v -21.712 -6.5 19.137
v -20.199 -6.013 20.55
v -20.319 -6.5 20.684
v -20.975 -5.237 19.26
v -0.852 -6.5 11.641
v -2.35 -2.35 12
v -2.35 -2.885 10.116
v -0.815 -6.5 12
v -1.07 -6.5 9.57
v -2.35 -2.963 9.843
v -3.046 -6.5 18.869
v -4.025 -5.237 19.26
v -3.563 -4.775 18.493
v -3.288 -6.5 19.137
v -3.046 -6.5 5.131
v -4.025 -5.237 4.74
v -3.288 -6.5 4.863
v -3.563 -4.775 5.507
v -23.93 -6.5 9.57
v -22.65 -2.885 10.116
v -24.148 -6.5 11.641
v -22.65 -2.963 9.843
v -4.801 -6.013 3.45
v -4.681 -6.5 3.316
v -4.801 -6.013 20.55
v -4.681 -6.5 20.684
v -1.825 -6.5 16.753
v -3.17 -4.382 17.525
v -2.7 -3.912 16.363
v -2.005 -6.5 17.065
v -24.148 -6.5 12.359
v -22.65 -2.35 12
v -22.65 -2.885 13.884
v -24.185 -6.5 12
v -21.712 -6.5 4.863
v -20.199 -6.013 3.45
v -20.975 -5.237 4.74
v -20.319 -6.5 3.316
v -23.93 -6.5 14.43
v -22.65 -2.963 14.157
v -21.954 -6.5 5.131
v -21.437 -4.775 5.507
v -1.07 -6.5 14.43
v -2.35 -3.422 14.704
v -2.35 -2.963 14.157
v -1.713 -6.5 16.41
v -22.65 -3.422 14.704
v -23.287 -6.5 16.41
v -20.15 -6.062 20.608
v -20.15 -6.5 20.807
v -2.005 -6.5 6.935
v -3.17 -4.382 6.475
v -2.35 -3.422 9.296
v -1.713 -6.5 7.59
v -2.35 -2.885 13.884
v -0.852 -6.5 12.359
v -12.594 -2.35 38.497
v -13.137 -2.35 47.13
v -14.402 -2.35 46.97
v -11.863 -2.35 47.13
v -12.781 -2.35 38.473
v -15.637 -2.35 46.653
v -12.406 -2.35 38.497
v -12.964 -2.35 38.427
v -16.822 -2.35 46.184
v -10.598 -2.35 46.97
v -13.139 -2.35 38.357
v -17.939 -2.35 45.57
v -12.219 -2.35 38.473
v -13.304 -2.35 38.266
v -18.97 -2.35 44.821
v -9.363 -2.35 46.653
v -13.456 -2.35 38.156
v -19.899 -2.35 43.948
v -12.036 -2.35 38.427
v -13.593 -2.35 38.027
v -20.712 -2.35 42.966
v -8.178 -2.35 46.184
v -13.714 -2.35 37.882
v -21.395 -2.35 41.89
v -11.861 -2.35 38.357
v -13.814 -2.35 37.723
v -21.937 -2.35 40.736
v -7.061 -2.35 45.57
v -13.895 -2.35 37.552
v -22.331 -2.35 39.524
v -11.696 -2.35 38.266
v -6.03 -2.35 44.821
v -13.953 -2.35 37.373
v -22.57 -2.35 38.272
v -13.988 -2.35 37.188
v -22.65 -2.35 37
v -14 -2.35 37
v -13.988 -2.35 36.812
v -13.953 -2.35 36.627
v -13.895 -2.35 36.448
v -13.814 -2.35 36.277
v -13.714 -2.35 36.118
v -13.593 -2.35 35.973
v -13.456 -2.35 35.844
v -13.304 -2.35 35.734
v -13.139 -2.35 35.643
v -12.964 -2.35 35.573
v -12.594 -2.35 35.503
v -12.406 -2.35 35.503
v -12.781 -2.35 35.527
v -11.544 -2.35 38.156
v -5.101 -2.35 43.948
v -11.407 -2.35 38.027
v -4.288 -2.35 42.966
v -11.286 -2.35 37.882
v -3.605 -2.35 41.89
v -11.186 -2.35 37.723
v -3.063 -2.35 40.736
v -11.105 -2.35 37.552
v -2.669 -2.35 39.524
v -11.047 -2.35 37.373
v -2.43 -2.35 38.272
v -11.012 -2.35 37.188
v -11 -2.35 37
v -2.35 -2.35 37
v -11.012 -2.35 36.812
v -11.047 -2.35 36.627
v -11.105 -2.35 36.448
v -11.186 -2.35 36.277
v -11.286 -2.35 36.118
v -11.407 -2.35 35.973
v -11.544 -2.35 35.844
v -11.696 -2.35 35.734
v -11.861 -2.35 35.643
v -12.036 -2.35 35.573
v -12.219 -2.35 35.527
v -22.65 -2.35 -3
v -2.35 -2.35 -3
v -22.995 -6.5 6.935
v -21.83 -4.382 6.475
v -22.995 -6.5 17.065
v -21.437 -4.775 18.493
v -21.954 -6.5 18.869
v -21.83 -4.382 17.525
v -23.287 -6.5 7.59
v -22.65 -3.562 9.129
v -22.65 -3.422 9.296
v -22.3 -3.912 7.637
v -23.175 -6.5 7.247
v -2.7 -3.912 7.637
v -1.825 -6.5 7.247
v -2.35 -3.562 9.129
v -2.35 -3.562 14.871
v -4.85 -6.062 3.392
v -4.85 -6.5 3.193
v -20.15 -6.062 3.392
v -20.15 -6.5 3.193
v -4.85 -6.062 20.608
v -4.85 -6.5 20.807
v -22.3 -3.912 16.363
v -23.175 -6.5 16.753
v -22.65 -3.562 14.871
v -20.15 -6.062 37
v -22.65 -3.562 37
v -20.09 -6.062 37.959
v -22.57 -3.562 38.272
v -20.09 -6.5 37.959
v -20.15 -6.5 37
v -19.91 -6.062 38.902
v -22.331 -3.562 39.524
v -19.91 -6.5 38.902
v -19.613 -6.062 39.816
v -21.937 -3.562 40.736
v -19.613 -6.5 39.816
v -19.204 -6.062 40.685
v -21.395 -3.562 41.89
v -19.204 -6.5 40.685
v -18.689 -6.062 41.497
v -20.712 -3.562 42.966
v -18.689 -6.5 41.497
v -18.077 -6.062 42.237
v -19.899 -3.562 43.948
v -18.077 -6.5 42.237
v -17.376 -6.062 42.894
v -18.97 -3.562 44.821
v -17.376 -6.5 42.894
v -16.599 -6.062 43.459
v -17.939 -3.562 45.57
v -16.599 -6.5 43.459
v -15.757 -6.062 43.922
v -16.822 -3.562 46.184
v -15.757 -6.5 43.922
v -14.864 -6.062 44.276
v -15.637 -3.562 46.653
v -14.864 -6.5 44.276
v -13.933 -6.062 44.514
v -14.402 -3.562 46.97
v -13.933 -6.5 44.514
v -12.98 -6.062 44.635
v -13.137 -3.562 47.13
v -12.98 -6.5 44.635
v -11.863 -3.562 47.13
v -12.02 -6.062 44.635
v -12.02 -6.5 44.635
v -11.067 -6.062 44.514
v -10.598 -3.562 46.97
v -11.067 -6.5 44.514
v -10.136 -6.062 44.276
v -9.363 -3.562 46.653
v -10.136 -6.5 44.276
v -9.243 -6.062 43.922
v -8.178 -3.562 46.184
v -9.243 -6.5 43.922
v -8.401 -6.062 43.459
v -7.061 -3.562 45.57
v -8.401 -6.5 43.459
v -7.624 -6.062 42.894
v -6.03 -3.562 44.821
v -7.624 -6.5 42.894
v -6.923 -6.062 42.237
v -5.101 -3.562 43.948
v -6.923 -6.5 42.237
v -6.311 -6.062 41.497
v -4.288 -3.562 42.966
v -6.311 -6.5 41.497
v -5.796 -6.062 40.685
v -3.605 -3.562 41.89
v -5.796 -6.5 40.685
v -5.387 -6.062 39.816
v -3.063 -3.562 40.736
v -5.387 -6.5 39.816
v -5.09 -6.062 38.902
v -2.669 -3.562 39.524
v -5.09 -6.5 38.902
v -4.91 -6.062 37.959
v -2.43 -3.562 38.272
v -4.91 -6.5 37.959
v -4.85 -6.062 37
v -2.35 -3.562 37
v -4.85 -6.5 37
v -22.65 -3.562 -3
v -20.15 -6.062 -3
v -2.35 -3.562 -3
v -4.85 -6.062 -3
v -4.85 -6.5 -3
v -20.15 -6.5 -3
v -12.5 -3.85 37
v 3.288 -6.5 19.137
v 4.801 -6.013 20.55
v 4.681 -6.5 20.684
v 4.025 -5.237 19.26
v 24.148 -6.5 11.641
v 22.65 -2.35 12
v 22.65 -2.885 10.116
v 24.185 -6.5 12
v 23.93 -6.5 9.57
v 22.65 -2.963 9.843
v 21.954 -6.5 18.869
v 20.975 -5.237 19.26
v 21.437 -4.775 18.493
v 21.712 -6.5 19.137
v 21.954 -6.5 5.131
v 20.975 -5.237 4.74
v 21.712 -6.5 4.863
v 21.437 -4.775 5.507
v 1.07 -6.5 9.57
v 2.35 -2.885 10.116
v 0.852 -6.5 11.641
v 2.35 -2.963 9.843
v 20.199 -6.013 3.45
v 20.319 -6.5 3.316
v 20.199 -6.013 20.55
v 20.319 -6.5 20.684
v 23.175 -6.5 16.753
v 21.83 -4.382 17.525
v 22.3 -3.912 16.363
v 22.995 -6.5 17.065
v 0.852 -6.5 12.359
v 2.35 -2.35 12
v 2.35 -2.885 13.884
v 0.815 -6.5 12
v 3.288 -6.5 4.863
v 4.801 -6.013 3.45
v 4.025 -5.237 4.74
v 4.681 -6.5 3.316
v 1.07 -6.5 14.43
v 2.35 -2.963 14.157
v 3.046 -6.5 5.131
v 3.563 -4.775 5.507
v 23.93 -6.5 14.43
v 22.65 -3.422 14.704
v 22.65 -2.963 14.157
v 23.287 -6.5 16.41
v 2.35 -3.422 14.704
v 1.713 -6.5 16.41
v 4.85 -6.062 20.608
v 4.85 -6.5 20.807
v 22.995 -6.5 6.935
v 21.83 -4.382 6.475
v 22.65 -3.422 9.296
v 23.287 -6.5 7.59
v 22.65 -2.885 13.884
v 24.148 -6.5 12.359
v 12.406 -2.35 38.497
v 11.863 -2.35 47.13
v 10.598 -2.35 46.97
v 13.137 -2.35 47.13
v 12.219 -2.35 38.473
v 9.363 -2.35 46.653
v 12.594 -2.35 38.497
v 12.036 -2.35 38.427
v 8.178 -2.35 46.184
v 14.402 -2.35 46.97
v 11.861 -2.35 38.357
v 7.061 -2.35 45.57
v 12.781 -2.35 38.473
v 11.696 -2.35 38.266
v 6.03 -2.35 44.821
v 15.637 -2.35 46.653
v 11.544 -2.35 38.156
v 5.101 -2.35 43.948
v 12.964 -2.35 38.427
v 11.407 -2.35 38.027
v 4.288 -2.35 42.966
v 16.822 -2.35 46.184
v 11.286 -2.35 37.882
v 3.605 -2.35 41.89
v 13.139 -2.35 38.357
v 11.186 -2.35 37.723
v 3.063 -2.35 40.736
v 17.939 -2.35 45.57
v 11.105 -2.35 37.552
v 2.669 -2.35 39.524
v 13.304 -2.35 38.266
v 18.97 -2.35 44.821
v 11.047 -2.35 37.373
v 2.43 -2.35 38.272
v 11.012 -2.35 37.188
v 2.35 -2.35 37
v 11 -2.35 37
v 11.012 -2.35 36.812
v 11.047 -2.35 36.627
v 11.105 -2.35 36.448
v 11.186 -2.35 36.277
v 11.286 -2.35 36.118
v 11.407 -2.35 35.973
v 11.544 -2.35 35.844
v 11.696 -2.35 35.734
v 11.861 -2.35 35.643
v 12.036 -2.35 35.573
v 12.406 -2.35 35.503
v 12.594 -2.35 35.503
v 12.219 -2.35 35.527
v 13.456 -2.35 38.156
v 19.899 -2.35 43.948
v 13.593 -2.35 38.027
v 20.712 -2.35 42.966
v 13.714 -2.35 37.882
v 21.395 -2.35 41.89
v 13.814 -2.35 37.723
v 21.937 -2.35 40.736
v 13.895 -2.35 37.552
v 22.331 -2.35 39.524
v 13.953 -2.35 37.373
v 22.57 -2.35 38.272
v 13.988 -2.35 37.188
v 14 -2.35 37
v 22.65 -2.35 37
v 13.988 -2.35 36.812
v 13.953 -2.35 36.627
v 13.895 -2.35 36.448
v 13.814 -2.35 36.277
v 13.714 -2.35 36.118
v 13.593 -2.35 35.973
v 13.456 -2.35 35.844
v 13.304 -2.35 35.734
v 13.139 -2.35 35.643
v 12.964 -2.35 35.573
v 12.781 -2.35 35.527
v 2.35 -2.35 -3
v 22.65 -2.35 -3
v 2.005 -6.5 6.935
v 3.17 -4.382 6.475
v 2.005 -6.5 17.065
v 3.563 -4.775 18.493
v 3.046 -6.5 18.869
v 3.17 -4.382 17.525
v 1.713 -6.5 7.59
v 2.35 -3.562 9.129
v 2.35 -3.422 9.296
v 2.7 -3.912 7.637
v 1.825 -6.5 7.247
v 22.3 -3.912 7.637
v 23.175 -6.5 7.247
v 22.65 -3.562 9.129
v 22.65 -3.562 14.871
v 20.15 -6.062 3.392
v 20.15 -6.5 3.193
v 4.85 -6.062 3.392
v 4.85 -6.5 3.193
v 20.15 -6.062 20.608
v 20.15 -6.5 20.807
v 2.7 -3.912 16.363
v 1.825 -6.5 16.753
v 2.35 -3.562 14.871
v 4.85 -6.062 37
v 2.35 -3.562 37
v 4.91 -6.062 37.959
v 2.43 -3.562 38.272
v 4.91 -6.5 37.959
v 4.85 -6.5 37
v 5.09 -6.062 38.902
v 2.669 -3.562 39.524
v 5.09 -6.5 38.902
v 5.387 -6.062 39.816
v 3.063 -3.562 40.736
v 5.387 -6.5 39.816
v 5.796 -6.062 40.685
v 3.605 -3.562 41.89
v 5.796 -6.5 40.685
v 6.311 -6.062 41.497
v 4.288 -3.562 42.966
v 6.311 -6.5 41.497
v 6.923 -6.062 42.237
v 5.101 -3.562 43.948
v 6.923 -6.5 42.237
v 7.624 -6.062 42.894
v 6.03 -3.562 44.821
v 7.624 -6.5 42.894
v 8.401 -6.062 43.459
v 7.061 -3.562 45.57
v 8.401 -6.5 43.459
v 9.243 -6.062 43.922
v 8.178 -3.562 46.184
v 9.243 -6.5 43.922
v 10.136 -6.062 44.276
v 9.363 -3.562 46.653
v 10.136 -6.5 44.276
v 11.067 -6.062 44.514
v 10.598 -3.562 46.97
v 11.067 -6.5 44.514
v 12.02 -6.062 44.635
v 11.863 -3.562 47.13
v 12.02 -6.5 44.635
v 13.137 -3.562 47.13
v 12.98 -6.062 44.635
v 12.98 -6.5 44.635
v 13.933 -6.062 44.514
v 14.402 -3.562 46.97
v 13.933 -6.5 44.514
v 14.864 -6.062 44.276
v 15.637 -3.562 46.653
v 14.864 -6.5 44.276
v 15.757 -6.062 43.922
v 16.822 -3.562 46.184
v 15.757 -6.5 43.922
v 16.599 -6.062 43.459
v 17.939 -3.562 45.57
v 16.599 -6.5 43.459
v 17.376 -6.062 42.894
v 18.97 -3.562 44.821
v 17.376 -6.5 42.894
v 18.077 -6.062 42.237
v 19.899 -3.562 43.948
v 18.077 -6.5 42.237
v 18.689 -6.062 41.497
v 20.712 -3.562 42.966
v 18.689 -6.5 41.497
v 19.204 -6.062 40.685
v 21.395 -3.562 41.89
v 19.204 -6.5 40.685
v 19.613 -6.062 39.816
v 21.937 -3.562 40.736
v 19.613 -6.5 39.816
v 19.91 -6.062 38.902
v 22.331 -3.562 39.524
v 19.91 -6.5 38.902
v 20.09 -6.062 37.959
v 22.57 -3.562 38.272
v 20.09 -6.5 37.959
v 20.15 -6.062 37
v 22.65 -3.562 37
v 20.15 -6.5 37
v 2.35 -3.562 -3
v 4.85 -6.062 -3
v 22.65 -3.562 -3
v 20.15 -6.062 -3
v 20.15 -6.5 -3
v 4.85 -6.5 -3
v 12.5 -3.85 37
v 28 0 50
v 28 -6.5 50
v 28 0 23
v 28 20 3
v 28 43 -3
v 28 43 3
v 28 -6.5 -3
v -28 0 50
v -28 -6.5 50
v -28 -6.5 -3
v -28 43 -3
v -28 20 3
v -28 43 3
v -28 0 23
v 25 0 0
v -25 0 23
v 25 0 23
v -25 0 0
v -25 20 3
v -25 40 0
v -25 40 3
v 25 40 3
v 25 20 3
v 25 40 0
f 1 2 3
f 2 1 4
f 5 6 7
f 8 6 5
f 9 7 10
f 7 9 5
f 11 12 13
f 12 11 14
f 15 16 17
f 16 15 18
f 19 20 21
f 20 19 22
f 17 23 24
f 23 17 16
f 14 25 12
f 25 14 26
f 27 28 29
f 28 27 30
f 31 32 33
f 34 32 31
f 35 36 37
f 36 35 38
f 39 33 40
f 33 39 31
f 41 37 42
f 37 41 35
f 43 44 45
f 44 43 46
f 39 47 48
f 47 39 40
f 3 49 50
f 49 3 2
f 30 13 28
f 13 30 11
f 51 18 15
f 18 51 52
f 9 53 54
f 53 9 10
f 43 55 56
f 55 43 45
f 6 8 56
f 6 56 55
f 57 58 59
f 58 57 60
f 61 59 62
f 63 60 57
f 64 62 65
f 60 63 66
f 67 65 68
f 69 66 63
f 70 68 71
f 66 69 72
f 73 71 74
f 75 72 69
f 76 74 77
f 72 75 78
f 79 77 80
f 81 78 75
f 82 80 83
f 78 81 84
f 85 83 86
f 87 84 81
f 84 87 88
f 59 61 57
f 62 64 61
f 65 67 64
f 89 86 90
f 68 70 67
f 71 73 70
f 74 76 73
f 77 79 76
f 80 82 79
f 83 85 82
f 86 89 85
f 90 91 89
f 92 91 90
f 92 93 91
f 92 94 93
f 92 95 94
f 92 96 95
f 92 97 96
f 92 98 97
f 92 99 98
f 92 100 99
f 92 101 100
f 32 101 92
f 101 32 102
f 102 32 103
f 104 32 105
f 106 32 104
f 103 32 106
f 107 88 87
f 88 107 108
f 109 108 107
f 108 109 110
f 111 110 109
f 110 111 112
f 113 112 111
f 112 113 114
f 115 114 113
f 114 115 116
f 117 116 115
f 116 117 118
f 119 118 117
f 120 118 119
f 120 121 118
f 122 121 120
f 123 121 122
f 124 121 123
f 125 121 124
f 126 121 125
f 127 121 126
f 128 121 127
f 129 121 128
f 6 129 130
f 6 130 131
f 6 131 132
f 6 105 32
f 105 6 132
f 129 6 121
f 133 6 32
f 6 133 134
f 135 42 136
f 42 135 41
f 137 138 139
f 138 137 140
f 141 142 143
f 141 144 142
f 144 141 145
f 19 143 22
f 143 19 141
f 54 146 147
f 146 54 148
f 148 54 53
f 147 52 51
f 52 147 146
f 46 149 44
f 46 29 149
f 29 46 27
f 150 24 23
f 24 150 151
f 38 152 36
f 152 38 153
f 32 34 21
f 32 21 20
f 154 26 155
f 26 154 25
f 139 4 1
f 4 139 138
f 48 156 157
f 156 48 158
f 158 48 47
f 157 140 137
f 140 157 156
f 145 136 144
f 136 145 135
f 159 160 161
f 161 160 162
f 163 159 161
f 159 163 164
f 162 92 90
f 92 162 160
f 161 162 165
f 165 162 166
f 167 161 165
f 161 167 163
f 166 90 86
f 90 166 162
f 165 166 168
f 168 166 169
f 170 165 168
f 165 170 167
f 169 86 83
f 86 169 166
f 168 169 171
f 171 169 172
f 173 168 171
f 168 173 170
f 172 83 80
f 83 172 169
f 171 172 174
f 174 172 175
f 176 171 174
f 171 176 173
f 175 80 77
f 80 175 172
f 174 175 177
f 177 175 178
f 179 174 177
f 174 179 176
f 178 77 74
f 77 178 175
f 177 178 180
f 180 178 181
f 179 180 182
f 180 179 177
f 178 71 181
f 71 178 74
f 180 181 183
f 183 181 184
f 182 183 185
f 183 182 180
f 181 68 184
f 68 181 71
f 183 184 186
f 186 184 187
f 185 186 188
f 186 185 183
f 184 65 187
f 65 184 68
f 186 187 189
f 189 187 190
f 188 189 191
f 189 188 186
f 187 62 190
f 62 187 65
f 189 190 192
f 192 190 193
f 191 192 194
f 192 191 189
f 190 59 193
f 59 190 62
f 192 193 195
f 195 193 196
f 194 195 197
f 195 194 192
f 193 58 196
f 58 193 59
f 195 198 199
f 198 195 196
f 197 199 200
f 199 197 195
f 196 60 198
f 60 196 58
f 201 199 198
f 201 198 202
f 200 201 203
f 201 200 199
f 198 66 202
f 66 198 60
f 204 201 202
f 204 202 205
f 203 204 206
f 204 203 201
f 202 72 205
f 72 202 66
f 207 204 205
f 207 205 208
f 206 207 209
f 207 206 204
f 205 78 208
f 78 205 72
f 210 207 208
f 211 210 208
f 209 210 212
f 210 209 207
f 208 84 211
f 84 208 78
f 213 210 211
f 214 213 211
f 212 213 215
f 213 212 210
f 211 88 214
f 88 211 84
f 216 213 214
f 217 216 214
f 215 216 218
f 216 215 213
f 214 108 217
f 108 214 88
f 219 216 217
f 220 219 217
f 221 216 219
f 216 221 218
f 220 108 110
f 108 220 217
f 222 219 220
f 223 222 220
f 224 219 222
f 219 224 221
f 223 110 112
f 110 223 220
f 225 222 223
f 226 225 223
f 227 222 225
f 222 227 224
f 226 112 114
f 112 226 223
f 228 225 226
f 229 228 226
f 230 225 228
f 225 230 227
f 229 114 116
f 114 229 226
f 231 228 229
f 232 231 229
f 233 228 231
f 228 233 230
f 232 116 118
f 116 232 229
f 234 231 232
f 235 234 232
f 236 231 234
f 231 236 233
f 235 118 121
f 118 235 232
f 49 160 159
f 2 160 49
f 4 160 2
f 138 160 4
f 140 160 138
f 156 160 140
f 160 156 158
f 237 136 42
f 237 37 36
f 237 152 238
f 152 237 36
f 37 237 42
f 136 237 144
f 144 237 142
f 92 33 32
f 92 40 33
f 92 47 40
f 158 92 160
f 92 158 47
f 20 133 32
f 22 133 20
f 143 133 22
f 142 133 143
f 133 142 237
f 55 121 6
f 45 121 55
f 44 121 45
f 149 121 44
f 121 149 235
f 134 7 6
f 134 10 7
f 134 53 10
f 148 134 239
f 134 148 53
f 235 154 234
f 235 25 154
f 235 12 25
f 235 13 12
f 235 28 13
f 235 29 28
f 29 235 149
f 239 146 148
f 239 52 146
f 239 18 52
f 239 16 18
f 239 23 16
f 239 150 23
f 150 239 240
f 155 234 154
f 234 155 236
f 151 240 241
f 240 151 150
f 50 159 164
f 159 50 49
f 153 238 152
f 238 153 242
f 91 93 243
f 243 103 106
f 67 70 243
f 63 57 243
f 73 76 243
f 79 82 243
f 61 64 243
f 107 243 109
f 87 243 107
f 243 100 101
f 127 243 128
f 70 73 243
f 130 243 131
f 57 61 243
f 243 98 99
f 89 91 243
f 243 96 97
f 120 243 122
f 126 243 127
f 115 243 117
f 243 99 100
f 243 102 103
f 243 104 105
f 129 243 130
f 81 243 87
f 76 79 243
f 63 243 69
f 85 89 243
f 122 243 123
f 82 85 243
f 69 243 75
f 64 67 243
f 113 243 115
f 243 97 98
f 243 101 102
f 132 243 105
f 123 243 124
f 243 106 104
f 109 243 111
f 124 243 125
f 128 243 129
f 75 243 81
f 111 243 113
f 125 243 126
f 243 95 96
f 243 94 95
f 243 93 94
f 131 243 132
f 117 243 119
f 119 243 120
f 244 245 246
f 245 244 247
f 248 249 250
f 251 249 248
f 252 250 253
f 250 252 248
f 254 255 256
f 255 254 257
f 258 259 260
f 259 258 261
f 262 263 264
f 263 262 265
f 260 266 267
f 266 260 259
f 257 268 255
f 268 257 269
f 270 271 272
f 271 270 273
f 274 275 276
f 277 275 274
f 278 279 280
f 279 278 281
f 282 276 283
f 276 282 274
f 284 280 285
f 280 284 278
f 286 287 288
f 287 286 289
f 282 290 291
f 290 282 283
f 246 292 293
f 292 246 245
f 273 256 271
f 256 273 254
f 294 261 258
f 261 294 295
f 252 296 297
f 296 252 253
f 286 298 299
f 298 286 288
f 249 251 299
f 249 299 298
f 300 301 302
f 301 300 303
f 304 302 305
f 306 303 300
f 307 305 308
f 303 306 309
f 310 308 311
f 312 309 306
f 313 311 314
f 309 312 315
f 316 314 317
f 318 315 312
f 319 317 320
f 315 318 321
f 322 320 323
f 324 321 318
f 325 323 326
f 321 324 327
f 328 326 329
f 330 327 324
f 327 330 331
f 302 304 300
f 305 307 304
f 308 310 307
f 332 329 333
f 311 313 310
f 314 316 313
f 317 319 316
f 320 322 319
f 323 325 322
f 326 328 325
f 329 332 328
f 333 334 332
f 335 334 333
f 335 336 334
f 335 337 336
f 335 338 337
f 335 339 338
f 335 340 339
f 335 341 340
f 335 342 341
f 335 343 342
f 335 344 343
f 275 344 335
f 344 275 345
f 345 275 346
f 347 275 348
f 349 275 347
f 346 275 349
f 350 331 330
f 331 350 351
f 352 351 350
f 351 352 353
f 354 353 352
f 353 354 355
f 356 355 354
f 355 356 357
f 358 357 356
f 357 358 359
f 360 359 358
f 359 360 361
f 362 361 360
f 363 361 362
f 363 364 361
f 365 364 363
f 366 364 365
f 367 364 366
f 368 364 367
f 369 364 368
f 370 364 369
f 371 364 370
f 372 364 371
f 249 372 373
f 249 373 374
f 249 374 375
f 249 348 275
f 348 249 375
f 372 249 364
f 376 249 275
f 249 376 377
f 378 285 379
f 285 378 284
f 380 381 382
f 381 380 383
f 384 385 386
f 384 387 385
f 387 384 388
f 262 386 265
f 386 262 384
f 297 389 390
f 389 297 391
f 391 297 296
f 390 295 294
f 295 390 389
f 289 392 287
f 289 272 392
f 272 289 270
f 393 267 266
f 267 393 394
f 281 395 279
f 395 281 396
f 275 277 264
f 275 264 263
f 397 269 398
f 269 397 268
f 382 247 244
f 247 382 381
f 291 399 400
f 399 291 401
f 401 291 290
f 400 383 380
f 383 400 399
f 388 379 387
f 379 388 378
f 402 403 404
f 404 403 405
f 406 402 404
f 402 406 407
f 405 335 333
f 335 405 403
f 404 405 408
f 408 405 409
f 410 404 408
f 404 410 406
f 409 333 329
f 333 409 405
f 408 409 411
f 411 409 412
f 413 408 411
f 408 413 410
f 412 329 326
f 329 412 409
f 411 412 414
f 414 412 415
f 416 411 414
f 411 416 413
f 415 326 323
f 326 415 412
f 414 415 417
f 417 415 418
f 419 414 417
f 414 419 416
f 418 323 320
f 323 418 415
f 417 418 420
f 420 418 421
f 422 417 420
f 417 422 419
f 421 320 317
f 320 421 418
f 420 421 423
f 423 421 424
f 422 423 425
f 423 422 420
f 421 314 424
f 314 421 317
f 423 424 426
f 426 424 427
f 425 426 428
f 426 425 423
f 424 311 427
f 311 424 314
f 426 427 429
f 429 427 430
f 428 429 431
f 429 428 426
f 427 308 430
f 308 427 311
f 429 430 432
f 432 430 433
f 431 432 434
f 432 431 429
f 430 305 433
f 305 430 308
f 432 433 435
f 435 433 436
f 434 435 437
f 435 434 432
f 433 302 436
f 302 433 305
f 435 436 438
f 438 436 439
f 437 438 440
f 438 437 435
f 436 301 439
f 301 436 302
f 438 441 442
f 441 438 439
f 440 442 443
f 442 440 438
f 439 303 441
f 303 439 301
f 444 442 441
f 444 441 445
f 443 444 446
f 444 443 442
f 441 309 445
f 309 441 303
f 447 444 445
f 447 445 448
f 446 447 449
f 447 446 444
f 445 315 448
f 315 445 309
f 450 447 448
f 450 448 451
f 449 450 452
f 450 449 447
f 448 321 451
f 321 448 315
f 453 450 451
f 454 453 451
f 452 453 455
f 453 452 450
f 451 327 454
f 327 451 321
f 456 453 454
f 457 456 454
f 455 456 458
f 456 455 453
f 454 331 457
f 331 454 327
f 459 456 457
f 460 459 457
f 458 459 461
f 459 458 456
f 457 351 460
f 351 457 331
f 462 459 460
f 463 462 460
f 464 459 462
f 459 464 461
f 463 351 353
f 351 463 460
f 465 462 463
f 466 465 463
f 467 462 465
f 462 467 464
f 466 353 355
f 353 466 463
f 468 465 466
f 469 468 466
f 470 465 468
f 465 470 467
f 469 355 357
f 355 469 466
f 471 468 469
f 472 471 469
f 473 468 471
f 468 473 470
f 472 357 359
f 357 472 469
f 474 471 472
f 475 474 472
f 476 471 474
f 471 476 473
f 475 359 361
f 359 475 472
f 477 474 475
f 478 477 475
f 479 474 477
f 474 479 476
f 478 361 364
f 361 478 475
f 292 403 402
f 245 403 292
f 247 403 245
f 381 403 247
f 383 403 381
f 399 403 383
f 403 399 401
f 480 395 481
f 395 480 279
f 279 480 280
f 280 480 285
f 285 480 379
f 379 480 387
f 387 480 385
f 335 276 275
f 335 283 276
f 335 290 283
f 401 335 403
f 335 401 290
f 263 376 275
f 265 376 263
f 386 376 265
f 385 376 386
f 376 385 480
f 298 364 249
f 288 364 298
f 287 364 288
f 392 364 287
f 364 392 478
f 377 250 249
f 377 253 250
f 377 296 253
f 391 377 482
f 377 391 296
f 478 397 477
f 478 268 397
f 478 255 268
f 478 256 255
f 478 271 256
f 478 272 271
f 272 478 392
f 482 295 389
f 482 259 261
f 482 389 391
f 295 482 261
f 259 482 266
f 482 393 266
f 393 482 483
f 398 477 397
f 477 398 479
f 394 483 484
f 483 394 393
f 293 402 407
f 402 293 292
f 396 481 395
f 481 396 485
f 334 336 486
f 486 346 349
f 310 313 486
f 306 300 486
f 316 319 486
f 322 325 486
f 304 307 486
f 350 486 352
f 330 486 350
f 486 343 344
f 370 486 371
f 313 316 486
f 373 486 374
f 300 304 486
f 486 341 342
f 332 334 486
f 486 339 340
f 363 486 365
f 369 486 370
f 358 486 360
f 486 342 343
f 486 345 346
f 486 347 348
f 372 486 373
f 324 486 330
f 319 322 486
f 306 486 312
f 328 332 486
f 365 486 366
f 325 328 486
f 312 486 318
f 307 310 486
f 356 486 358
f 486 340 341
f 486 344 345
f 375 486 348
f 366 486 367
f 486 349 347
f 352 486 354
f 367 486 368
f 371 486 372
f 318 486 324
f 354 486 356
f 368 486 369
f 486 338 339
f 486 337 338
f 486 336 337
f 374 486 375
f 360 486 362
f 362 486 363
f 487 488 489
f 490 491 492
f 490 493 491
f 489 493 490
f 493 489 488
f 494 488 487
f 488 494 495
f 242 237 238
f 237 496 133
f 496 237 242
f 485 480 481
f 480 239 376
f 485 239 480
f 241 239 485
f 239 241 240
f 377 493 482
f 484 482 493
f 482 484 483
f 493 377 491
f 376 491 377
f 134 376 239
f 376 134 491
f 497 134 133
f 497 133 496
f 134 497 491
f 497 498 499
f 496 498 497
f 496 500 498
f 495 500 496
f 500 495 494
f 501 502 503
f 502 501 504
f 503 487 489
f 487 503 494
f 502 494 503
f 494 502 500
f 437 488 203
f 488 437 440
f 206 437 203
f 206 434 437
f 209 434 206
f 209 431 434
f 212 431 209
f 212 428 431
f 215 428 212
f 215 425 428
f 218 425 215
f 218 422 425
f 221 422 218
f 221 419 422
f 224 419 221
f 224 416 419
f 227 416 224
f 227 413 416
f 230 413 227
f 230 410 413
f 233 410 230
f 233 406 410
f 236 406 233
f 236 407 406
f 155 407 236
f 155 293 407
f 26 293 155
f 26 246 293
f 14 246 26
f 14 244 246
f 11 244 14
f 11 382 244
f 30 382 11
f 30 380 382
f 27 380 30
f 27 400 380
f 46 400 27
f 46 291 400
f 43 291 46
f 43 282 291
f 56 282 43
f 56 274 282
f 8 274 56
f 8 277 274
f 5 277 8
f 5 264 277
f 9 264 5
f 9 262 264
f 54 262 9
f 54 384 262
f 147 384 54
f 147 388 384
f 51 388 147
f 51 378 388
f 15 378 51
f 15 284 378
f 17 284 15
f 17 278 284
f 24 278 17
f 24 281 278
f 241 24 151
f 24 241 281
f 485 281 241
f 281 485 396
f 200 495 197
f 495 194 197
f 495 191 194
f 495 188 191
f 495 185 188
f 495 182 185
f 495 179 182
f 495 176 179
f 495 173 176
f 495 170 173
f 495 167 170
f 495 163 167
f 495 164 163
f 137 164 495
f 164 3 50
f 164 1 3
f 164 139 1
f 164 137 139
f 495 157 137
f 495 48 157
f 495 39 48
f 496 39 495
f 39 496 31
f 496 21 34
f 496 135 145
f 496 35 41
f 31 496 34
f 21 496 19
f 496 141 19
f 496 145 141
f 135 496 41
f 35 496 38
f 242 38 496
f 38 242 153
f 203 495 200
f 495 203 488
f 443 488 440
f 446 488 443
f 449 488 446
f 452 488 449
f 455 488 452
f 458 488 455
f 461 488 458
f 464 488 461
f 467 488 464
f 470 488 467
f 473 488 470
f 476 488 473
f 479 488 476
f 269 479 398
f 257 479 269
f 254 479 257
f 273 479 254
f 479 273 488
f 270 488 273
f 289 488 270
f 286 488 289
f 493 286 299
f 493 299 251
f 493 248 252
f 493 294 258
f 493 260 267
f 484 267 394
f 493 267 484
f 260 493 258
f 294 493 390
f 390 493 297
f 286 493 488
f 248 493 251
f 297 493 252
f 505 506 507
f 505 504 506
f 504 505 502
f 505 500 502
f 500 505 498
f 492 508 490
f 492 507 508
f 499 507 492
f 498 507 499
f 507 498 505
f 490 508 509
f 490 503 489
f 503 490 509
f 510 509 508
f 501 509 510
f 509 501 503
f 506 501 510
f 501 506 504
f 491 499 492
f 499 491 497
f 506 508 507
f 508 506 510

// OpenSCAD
/*Created by Andy Levesque
Credit to @David D on Printables and Jonathan at Keep Making for Multiconnect and Multiboard, respectively
Licensed Creative Commons 4.0 Attribution Non-Commercial Sharable with Attribution
*/

/* [Internal Dimensions] */
//Height (in mm) from the top of the back to the base of the internal floor
internalHeight = 50.0; //.1
//Width (in mm) of the internal dimension or item you wish to hold
internalWidth = 50.0; //.1
//Length (i.e., distance from back) (in mm) of the internal dimension or item you wish to hold
internalDepth = 40.0; //.1

/* [Shelf Customizations] */
//Distance upward from the bottom (in mm) that captures the bottom front of the item
rimHeight = 3;
bracket_style = "45deg"; //[45deg,half_distance,none]

/* [Additional Customization] */
//Thickness of bin walls (in mm)
wallThickness = 3; //.1
//Thickness of bin  (in mm)
baseThickness = 3; //.1

/*[Slot Customization]*/
//Distance between Multiconnect slots on the back (25mm is standard for MultiBoard)
distanceBetweenSlots = 25;
//QuickRelease removes the small indent in the top of the slots that lock the part into place
slotQuickRelease = false;
//Dimple scale tweaks the size of the dimple in the slot for printers that need a larger dimple to print correctly
dimpleScale = 1; //[0.5:.05:1.5]
//Scale the size of slots in the back (1.015 scale is default for a tight fit. Increase if your finding poor fit. )
slotTolerance = 1.00; //[0.925:0.005:1.075]
//Move the slot in (positive) or out (negative)
slotDepthMicroadjustment = 0; //[-.5:0.05:.5]
//enable a slot on-ramp for easy mounting of tall items
onRampEnabled = true;
//frequency of slots for on-ramp. 1 = every slot; 2 = every 2 slots; etc.
onRampEveryXSlots = 1;


/* [Hidden] */

//Calculated
totalHeight = max(internalHeight+baseThickness,distanceBetweenSlots);
totalDepth = internalDepth + wallThickness;
totalWidth = max(internalWidth + wallThickness*2,distanceBetweenSlots);
productCenterX = internalWidth/2;


//move to center
translate(v = [-totalWidth/2,0,-baseThickness]) 
    multiconnectBack(backWidth = totalWidth, backHeight = totalHeight, distanceBetweenSlots = distanceBetweenSlots);
translate(v = [-internalWidth/2,0,0]) 
    //Basket minus slots
    difference() {
        shelf();
            //delete tool for anything above the product (i.e., bracket fix)
        translate(v = [-wallThickness-1 ,-1,internalHeight]) cube([totalWidth+2,totalDepth+2,totalHeight]); 
    }

//Create Basket
module shelf() {
    union() {
        //bottom
        translate([-wallThickness,0,-baseThickness])
            cube([internalWidth + wallThickness*2, internalDepth + wallThickness,baseThickness]);

        //left wall
        translate([-wallThickness,0,0])
            cube([wallThickness, internalDepth + wallThickness, rimHeight]);

        //right wall
        translate([internalWidth,0,0])
            cube([wallThickness, internalDepth + wallThickness, rimHeight]);

        //front wall
        translate([0,internalDepth,0]) 
            cube([internalWidth,wallThickness,rimHeight]);

        bracketDistance = min(internalHeight/2,internalDepth/2);
        echo(str("Bracket Distance: ",bracketDistance));
        
        //shelf brackets      
        if (bracket_style == "half_distance") {
            translate(v = [0,0,internalHeight/2+rimHeight])
                shelfBracket(bracketHeight = internalHeight/2, bracketDepth = internalDepth/2);
            translate(v = [internalWidth+wallThickness,0,internalHeight/2+rimHeight])
                shelfBracket(bracketHeight = internalHeight/2, bracketDepth = internalDepth/2);
        }
        if (bracket_style == "45deg"){
            translate(v = [0,0,bracketDistance+rimHeight])
                shelfBracket(bracketHeight = bracketDistance, bracketDepth = bracketDistance);
            translate(v = [internalWidth+wallThickness,0,bracketDistance+rimHeight])
                shelfBracket(bracketHeight = bracketDistance, bracketDepth = bracketDistance);
        }
    }
            
}

//BEGIN MODULES
//Slotted back Module
module multiconnectBack(backWidth, backHeight, distanceBetweenSlots)
{
    //slot count calculates how many slots can fit on the back. Based on internal width for buffer. 
    //slot width needs to be at least the distance between slot for at least 1 slot to generate
    let (backWidth = max(backWidth,distanceBetweenSlots), backHeight = max(backHeight, 25),slotCount = floor(backWidth/distanceBetweenSlots), backThickness = 6.5){
        difference() {
            translate(v = [0,-backThickness,0]) cube(size = [backWidth,backThickness,backHeight]);
            //Loop through slots and center on the item
            //Note: I kept doing math until it looked right. It's possible this can be simplified.
            for (slotNum = [0:1:slotCount-1]) {
                translate(v = [distanceBetweenSlots/2+(backWidth/distanceBetweenSlots-slotCount)*distanceBetweenSlots/2+slotNum*distanceBetweenSlots,-2.35+slotDepthMicroadjustment,backHeight-13]) {
                    slotTool(backHeight);
                }
            }
        }
    }
    //Create Slot Tool
    module slotTool(totalHeight) {
        scale(v = slotTolerance)
        //slot minus optional dimple with optional on-ramp
        let (slotProfile = [[0,0],[10.15,0],[10.15,1.2121],[7.65,3.712],[7.65,5],[0,5]])
        difference() {
            union() {
                //round top
                rotate(a = [90,0,0,]) 
                    rotate_extrude($fn=50) 
                        polygon(points = slotProfile);
                //long slot
                translate(v = [0,0,0]) 
                    rotate(a = [180,0,0]) 
                    linear_extrude(height = totalHeight+1) 
                        union(){
                            polygon(points = slotProfile);
                            mirror([1,0,0])
                                polygon(points = slotProfile);
                        }
                //on-ramp
                if(onRampEnabled)
                    for(y = [1:onRampEveryXSlots:totalHeight/distanceBetweenSlots])
                        translate(v = [0,-5,-y*distanceBetweenSlots]) 
                            rotate(a = [-90,0,0]) 
                                cylinder(h = 5, r1 = 12, r2 = 10.15);
            }
            //dimple
            if (slotQuickRelease == false)
                scale(v = dimpleScale) 
                rotate(a = [90,0,0,]) 
                    rotate_extrude($fn=50) 
                        polygon(points = [[0,0],[0,1.5],[1.5,0]]);
        }
    }
}

module shelfBracket(bracketHeight, bracketDepth){
        rotate(a = [-90,0,90]) 
            linear_extrude(height = wallThickness) 
                polygon([[0,0],[0,bracketHeight],[bracketDepth,bracketHeight]]);
}
